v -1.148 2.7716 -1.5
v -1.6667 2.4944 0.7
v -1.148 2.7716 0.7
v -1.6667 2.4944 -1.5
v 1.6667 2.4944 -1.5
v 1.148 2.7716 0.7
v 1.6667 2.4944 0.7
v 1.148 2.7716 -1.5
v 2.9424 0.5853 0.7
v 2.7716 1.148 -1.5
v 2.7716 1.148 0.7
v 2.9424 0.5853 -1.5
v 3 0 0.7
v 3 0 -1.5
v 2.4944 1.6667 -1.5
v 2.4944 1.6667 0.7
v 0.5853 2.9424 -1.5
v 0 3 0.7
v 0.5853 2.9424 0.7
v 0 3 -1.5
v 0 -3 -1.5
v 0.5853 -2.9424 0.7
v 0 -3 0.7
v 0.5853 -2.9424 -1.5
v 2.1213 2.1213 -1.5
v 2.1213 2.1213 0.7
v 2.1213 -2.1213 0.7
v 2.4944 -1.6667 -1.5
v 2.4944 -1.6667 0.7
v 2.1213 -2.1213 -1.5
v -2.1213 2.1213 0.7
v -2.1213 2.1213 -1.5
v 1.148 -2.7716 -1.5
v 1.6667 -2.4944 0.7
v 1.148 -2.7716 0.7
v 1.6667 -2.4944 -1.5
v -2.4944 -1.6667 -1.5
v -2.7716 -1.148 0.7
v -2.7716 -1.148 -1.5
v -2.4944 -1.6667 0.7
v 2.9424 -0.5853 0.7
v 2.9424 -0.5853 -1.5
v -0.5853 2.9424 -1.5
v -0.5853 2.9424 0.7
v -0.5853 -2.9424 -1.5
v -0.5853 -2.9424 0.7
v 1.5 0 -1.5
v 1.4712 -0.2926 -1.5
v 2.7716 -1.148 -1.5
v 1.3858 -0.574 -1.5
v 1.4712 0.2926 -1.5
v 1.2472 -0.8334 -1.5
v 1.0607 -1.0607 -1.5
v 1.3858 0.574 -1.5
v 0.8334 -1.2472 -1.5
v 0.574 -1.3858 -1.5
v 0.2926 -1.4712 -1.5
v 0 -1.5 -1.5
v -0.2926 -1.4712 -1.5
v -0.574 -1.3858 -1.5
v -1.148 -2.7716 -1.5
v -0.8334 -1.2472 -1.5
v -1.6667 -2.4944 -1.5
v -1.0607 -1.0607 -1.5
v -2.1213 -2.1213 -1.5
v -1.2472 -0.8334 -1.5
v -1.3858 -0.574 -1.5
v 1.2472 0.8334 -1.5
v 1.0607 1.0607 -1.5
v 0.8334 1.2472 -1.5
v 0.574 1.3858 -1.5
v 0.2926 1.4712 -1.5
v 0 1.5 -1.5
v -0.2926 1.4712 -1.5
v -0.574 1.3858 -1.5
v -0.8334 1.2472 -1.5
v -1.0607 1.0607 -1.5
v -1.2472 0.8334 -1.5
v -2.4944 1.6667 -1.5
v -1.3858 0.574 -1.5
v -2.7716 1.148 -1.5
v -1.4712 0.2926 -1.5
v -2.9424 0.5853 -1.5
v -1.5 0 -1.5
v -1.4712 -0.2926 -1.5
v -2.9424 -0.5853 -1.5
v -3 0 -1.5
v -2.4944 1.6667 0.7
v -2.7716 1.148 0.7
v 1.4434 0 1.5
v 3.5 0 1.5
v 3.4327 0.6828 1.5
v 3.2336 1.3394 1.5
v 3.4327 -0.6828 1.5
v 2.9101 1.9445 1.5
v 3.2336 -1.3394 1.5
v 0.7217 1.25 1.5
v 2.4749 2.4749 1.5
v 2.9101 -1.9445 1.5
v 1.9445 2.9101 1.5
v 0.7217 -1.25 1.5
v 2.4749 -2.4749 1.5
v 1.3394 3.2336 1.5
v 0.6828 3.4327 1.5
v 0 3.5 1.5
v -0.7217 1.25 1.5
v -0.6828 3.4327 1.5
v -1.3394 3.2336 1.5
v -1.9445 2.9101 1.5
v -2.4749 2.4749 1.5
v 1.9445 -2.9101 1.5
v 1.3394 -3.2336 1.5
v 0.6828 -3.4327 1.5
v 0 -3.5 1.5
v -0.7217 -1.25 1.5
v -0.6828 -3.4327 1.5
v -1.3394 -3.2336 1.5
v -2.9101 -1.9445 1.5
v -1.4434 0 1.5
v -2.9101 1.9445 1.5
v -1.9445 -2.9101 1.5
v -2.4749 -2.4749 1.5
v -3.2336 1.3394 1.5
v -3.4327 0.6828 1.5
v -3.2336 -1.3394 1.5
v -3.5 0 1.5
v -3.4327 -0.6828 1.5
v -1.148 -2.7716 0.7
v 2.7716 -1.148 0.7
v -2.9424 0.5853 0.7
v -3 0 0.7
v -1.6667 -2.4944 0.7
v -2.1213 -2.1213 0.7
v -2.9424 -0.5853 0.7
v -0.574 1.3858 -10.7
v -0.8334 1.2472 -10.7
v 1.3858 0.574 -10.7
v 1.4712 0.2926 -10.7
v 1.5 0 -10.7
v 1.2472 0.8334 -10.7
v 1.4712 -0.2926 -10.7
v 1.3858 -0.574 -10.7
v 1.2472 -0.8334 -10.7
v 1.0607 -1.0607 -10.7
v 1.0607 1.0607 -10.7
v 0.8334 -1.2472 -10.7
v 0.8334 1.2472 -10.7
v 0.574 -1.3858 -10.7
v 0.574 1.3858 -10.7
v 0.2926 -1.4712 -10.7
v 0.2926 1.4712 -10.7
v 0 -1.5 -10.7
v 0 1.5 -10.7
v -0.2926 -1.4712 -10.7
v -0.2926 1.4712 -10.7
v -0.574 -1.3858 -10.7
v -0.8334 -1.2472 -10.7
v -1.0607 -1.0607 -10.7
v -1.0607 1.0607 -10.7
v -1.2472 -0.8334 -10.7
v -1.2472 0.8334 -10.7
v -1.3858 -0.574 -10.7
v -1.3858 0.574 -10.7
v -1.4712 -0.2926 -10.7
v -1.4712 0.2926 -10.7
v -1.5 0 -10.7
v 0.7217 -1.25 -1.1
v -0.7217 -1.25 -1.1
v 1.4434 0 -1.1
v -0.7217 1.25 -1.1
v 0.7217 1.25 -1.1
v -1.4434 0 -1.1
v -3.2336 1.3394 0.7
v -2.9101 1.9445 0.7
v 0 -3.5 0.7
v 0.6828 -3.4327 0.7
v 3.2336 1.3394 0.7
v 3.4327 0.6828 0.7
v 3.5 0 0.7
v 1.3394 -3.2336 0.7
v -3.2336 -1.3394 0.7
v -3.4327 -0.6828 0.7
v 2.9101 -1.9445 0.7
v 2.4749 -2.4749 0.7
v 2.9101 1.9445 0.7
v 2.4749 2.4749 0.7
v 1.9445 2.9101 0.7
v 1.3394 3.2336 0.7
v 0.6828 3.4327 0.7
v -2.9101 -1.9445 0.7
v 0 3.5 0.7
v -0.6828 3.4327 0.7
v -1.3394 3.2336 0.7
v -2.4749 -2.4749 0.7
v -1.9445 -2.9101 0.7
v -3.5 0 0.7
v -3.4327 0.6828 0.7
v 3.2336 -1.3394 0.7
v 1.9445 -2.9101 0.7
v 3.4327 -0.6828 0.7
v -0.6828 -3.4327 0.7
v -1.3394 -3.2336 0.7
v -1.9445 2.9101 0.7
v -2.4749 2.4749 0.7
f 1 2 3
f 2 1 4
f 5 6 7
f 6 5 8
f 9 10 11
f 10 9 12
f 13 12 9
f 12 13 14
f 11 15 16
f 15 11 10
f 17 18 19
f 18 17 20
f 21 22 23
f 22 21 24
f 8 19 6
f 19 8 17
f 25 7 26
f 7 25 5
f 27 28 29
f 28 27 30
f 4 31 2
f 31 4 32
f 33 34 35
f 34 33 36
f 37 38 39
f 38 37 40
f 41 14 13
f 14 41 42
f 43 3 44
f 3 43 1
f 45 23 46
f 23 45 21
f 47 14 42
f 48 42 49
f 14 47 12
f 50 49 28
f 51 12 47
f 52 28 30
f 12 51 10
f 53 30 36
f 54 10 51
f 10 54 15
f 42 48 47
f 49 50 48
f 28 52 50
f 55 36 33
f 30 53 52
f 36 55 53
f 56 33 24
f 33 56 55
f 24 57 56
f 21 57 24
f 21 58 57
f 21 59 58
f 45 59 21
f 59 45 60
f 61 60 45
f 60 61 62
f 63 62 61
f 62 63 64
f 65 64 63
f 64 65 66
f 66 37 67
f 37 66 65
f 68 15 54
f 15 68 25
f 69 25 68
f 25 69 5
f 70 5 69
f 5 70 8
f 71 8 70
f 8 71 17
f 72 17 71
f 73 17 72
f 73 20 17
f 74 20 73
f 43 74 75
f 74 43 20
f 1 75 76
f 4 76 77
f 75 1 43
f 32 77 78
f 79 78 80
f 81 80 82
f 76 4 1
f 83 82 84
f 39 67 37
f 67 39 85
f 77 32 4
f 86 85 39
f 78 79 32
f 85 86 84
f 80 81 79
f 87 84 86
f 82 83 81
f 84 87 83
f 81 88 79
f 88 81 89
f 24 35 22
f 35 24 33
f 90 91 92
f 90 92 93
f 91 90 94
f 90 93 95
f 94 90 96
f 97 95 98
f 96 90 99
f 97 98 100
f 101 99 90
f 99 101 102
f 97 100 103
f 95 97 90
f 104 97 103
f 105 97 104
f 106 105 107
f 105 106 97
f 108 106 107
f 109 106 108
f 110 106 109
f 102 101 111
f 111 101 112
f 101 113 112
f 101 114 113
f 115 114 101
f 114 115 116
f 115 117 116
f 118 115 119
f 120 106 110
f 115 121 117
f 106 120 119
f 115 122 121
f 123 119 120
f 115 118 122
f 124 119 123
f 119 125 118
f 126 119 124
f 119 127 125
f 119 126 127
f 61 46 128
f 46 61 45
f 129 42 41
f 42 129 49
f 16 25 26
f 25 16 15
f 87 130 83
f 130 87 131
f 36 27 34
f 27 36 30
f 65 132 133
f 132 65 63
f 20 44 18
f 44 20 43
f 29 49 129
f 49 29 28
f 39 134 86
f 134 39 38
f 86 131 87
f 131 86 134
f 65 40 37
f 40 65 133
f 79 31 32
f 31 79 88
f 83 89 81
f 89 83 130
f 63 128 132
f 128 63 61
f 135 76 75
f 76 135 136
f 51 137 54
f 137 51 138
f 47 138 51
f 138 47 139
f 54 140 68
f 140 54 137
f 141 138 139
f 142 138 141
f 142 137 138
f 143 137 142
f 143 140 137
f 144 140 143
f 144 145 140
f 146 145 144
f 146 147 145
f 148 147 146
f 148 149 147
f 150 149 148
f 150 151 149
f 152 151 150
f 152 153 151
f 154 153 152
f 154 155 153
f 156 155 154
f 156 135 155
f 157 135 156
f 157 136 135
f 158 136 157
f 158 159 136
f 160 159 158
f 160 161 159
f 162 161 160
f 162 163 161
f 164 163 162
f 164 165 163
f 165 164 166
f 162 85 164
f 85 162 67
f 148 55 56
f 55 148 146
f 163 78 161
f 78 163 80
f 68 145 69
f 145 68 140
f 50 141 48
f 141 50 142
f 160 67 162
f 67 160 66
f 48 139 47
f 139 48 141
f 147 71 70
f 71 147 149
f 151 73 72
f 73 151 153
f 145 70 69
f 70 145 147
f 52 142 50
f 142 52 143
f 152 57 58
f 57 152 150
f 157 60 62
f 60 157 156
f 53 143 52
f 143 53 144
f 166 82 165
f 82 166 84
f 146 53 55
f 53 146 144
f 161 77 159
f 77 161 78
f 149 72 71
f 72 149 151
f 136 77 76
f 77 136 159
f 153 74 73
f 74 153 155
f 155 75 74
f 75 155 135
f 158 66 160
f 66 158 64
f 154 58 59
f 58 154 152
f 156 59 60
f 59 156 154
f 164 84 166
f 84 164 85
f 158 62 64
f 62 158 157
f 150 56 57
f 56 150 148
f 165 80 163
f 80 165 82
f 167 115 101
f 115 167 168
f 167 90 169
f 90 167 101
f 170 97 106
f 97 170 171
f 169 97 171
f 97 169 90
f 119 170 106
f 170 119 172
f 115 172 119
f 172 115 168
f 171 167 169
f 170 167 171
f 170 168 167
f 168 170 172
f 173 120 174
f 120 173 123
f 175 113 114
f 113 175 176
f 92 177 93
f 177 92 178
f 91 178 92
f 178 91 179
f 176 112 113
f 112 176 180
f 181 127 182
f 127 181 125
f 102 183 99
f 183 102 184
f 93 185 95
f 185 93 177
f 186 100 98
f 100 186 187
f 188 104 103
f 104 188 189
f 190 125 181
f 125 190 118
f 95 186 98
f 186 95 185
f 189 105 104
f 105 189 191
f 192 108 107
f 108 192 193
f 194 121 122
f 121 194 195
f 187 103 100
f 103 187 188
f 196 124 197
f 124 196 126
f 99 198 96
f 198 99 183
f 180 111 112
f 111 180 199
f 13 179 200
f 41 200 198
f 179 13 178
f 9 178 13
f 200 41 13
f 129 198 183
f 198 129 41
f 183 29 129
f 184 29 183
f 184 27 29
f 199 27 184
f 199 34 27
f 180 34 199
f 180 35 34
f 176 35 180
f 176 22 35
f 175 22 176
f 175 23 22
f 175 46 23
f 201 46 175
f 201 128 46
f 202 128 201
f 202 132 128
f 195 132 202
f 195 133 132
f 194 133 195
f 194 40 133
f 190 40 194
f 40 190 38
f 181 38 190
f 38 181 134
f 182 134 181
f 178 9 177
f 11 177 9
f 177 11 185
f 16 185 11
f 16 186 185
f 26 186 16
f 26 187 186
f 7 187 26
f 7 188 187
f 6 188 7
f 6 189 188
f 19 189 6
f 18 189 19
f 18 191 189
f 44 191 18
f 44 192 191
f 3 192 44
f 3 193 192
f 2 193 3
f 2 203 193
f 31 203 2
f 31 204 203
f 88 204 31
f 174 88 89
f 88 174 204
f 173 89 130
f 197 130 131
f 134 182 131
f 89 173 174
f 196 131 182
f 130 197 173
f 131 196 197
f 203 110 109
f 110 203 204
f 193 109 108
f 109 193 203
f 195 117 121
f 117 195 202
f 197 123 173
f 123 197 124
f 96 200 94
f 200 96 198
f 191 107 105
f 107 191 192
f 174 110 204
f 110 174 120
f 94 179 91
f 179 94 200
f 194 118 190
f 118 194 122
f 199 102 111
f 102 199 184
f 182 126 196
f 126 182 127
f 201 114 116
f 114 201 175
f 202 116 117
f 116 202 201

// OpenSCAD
// Parameters
thread_diameter_mm = 3.0; //[1.5:6.0:0.1]
length_mm = 10.0; //[5.0:20.0:0.5]
head_diameter_mm = 6.0; //[3.0:12.0:0.1]
head_height_mm = 3.0; //[1.5:6.0:0.1]
hex_socket_af_mm = 2.5; //[1.5:5.0:0.1]
hex_socket_depth_mm = 1.8; //[0.8:3.5:0.1]
thread_minor_diameter_mm = 2.7; //[1.3:5.4:0.1]
threaded_shaft_smooth_fraction = 1.0; //[0.5:1.0:0.05]
washer_outer_diameter_mm = 7.0; //[4.0:14.0:0.1]
washer_thickness_mm = 0.8; //[0.4:2.0:0.1]
washer_hole_diameter_mm = 3.4; //[2.0:7.0:0.1]
overlap_mm = 0.8; //[0.2:2.0:0.1]

// Screw and Washer - complete geometry
module screw_and_washer() {
  color("DimGray") {
    // Screw
    difference() {
      union() {
        // Socket Head
        translate([0, 0, 0])
          cylinder(r=head_diameter_mm/2, h=head_height_mm, center=true, $fn=32);
        // Threaded Shaft
        translate([0, 0, -head_height_mm/2 - length_mm/2 + overlap_mm])
          cylinder(r=thread_diameter_mm/2, h=length_mm, center=true, $fn=32);
      }
      // Hex Socket Drive
      translate([0, 0, head_height_mm/2 - (hex_socket_depth_mm + overlap_mm)/2])
        rotate([0, 0, 0])
        cylinder(r=hex_socket_af_mm/(2*cos(30)), h=hex_socket_depth_mm + overlap_mm, center=true, $fn=6);
    }
  }
  
  color("Silver") {
    // Washer
    difference() {
      translate([0, 0, head_height_mm/2 + washer_thickness_mm/2 - overlap_mm])
        cylinder(r=washer_outer_diameter_mm/2, h=washer_thickness_mm, center=true, $fn=32);
      translate([0, 0, head_height_mm/2 + washer_thickness_mm/2 - overlap_mm])
        cylinder(r=washer_hole_diameter_mm/2, h=washer_thickness_mm + 2*overlap_mm, center=true, $fn=32);
    }
  }
}

// Assembly
module assembly() {
  screw_and_washer();
}

assembly();
